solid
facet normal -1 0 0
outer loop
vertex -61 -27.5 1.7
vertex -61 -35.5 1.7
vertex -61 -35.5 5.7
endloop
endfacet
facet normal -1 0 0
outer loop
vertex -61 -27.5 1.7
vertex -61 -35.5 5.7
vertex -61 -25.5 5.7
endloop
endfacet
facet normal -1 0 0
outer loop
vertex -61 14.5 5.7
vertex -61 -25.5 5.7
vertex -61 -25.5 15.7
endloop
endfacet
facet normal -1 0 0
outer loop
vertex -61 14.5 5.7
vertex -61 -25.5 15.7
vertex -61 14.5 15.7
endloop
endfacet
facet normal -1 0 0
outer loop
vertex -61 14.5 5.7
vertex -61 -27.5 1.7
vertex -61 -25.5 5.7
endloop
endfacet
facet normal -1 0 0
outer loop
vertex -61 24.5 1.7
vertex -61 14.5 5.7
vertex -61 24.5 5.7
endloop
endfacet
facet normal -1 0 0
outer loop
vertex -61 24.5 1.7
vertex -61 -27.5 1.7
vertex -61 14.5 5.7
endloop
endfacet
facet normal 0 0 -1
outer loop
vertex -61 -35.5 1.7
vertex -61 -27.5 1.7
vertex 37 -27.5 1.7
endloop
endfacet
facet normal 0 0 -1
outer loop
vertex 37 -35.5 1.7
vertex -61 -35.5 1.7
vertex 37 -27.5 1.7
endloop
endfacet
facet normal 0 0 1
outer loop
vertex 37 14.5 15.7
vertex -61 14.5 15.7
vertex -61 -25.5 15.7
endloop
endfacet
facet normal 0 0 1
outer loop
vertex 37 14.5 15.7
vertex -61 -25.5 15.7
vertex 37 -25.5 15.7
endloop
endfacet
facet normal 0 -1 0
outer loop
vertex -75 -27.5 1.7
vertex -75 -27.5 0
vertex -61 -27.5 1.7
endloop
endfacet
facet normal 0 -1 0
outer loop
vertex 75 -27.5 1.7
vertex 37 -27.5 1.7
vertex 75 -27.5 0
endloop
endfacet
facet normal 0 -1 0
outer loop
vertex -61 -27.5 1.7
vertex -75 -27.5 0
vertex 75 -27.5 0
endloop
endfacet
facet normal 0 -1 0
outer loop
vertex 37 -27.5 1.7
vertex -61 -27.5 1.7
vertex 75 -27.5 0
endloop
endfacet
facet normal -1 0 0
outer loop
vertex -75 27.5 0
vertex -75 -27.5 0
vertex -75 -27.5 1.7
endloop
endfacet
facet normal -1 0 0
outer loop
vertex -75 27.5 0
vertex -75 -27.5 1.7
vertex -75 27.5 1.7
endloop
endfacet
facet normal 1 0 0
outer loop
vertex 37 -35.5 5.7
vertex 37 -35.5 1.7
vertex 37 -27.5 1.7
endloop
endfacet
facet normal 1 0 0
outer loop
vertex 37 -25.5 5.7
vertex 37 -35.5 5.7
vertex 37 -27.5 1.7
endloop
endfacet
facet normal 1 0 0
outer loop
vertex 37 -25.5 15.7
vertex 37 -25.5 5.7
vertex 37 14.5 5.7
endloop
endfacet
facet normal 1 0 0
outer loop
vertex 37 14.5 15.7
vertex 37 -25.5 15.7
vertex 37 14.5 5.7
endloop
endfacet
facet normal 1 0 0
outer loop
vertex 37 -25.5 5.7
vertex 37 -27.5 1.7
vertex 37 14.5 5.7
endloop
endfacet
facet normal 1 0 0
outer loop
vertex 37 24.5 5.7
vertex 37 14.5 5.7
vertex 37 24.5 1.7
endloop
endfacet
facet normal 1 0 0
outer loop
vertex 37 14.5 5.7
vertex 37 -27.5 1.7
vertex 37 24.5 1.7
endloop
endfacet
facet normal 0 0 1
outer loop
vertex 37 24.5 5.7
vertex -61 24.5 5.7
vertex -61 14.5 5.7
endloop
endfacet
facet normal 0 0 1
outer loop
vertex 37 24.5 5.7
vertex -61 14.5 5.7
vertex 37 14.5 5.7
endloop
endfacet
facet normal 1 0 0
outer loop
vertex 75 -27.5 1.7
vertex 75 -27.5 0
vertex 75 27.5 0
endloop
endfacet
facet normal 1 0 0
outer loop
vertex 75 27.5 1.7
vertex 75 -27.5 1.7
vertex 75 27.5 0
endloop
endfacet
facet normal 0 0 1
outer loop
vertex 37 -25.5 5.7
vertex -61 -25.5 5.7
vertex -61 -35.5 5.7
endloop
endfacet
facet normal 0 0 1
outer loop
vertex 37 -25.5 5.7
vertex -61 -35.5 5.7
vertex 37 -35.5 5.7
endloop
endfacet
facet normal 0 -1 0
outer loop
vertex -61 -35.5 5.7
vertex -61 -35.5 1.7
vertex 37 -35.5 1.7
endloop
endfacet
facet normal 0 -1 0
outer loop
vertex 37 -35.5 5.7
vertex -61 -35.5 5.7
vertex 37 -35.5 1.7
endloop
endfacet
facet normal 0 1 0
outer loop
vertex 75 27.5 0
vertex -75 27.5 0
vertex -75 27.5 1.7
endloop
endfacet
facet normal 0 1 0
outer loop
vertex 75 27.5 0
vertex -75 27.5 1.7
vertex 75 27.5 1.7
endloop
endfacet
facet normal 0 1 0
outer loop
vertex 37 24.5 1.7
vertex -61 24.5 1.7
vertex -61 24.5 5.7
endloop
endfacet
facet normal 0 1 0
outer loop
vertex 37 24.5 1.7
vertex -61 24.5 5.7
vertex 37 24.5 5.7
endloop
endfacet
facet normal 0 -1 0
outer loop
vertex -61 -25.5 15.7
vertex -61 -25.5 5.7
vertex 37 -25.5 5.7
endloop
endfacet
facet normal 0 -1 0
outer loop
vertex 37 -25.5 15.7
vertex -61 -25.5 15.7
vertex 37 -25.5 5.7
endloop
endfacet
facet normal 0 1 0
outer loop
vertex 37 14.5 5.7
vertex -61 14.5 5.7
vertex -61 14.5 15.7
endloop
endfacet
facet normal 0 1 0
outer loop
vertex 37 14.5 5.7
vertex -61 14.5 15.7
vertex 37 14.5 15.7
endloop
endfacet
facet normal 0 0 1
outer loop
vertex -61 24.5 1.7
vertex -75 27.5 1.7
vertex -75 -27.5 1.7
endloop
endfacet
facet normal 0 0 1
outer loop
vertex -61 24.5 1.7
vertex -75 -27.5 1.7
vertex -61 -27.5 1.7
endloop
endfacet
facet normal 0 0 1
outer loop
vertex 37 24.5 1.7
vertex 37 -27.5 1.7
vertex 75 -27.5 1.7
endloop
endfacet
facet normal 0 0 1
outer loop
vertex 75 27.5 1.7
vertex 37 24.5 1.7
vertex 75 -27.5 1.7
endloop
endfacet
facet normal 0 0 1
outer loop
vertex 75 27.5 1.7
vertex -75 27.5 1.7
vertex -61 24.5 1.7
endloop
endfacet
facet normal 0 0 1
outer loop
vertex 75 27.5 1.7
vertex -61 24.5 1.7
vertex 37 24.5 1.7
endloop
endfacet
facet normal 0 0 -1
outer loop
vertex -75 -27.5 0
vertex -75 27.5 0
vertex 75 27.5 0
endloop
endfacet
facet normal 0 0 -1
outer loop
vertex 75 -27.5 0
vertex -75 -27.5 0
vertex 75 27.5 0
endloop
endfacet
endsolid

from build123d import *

# Parameters (mm, degrees)
SCHIZZO1_W                   = 150
SCHIZZO1_H                   = 55
ESTRUSIONE_ESTRUSIONE1_DEPTH = 1.7
SCHIZZO2_W                   = 98
SCHIZZO2_H                   = 60
ESTRUSIONE_ESTRUSIONE2_DEPTH = 4
SCHIZZO3_W                   = 98
SCHIZZO3_H                   = 40
ESTRUSIONE_ESTRUSIONE3_DEPTH = 10


with BuildPart() as part:
    # Schizzo1 → Estrusione-Estrusione1 (new body)
    with BuildSketch(Plane.XY):
        Rectangle(SCHIZZO1_W, SCHIZZO1_H)
    extrude(amount=ESTRUSIONE_ESTRUSIONE1_DEPTH)

    # Schizzo2 → Estrusione-Estrusione2 (add)
    with BuildSketch(Plane.XY.offset(1.7)):
        with Locations((-12, -5.5)):
            Rectangle(SCHIZZO2_W, SCHIZZO2_H)
    extrude(amount=ESTRUSIONE_ESTRUSIONE2_DEPTH)

    # Schizzo3 → Estrusione-Estrusione3 (add)
    with BuildSketch(Plane.XY.offset(5.7)):
        with Locations((-12, -5.5)):
            Rectangle(SCHIZZO3_W, SCHIZZO3_H)
    extrude(amount=ESTRUSIONE_ESTRUSIONE3_DEPTH)


solid = part.part
